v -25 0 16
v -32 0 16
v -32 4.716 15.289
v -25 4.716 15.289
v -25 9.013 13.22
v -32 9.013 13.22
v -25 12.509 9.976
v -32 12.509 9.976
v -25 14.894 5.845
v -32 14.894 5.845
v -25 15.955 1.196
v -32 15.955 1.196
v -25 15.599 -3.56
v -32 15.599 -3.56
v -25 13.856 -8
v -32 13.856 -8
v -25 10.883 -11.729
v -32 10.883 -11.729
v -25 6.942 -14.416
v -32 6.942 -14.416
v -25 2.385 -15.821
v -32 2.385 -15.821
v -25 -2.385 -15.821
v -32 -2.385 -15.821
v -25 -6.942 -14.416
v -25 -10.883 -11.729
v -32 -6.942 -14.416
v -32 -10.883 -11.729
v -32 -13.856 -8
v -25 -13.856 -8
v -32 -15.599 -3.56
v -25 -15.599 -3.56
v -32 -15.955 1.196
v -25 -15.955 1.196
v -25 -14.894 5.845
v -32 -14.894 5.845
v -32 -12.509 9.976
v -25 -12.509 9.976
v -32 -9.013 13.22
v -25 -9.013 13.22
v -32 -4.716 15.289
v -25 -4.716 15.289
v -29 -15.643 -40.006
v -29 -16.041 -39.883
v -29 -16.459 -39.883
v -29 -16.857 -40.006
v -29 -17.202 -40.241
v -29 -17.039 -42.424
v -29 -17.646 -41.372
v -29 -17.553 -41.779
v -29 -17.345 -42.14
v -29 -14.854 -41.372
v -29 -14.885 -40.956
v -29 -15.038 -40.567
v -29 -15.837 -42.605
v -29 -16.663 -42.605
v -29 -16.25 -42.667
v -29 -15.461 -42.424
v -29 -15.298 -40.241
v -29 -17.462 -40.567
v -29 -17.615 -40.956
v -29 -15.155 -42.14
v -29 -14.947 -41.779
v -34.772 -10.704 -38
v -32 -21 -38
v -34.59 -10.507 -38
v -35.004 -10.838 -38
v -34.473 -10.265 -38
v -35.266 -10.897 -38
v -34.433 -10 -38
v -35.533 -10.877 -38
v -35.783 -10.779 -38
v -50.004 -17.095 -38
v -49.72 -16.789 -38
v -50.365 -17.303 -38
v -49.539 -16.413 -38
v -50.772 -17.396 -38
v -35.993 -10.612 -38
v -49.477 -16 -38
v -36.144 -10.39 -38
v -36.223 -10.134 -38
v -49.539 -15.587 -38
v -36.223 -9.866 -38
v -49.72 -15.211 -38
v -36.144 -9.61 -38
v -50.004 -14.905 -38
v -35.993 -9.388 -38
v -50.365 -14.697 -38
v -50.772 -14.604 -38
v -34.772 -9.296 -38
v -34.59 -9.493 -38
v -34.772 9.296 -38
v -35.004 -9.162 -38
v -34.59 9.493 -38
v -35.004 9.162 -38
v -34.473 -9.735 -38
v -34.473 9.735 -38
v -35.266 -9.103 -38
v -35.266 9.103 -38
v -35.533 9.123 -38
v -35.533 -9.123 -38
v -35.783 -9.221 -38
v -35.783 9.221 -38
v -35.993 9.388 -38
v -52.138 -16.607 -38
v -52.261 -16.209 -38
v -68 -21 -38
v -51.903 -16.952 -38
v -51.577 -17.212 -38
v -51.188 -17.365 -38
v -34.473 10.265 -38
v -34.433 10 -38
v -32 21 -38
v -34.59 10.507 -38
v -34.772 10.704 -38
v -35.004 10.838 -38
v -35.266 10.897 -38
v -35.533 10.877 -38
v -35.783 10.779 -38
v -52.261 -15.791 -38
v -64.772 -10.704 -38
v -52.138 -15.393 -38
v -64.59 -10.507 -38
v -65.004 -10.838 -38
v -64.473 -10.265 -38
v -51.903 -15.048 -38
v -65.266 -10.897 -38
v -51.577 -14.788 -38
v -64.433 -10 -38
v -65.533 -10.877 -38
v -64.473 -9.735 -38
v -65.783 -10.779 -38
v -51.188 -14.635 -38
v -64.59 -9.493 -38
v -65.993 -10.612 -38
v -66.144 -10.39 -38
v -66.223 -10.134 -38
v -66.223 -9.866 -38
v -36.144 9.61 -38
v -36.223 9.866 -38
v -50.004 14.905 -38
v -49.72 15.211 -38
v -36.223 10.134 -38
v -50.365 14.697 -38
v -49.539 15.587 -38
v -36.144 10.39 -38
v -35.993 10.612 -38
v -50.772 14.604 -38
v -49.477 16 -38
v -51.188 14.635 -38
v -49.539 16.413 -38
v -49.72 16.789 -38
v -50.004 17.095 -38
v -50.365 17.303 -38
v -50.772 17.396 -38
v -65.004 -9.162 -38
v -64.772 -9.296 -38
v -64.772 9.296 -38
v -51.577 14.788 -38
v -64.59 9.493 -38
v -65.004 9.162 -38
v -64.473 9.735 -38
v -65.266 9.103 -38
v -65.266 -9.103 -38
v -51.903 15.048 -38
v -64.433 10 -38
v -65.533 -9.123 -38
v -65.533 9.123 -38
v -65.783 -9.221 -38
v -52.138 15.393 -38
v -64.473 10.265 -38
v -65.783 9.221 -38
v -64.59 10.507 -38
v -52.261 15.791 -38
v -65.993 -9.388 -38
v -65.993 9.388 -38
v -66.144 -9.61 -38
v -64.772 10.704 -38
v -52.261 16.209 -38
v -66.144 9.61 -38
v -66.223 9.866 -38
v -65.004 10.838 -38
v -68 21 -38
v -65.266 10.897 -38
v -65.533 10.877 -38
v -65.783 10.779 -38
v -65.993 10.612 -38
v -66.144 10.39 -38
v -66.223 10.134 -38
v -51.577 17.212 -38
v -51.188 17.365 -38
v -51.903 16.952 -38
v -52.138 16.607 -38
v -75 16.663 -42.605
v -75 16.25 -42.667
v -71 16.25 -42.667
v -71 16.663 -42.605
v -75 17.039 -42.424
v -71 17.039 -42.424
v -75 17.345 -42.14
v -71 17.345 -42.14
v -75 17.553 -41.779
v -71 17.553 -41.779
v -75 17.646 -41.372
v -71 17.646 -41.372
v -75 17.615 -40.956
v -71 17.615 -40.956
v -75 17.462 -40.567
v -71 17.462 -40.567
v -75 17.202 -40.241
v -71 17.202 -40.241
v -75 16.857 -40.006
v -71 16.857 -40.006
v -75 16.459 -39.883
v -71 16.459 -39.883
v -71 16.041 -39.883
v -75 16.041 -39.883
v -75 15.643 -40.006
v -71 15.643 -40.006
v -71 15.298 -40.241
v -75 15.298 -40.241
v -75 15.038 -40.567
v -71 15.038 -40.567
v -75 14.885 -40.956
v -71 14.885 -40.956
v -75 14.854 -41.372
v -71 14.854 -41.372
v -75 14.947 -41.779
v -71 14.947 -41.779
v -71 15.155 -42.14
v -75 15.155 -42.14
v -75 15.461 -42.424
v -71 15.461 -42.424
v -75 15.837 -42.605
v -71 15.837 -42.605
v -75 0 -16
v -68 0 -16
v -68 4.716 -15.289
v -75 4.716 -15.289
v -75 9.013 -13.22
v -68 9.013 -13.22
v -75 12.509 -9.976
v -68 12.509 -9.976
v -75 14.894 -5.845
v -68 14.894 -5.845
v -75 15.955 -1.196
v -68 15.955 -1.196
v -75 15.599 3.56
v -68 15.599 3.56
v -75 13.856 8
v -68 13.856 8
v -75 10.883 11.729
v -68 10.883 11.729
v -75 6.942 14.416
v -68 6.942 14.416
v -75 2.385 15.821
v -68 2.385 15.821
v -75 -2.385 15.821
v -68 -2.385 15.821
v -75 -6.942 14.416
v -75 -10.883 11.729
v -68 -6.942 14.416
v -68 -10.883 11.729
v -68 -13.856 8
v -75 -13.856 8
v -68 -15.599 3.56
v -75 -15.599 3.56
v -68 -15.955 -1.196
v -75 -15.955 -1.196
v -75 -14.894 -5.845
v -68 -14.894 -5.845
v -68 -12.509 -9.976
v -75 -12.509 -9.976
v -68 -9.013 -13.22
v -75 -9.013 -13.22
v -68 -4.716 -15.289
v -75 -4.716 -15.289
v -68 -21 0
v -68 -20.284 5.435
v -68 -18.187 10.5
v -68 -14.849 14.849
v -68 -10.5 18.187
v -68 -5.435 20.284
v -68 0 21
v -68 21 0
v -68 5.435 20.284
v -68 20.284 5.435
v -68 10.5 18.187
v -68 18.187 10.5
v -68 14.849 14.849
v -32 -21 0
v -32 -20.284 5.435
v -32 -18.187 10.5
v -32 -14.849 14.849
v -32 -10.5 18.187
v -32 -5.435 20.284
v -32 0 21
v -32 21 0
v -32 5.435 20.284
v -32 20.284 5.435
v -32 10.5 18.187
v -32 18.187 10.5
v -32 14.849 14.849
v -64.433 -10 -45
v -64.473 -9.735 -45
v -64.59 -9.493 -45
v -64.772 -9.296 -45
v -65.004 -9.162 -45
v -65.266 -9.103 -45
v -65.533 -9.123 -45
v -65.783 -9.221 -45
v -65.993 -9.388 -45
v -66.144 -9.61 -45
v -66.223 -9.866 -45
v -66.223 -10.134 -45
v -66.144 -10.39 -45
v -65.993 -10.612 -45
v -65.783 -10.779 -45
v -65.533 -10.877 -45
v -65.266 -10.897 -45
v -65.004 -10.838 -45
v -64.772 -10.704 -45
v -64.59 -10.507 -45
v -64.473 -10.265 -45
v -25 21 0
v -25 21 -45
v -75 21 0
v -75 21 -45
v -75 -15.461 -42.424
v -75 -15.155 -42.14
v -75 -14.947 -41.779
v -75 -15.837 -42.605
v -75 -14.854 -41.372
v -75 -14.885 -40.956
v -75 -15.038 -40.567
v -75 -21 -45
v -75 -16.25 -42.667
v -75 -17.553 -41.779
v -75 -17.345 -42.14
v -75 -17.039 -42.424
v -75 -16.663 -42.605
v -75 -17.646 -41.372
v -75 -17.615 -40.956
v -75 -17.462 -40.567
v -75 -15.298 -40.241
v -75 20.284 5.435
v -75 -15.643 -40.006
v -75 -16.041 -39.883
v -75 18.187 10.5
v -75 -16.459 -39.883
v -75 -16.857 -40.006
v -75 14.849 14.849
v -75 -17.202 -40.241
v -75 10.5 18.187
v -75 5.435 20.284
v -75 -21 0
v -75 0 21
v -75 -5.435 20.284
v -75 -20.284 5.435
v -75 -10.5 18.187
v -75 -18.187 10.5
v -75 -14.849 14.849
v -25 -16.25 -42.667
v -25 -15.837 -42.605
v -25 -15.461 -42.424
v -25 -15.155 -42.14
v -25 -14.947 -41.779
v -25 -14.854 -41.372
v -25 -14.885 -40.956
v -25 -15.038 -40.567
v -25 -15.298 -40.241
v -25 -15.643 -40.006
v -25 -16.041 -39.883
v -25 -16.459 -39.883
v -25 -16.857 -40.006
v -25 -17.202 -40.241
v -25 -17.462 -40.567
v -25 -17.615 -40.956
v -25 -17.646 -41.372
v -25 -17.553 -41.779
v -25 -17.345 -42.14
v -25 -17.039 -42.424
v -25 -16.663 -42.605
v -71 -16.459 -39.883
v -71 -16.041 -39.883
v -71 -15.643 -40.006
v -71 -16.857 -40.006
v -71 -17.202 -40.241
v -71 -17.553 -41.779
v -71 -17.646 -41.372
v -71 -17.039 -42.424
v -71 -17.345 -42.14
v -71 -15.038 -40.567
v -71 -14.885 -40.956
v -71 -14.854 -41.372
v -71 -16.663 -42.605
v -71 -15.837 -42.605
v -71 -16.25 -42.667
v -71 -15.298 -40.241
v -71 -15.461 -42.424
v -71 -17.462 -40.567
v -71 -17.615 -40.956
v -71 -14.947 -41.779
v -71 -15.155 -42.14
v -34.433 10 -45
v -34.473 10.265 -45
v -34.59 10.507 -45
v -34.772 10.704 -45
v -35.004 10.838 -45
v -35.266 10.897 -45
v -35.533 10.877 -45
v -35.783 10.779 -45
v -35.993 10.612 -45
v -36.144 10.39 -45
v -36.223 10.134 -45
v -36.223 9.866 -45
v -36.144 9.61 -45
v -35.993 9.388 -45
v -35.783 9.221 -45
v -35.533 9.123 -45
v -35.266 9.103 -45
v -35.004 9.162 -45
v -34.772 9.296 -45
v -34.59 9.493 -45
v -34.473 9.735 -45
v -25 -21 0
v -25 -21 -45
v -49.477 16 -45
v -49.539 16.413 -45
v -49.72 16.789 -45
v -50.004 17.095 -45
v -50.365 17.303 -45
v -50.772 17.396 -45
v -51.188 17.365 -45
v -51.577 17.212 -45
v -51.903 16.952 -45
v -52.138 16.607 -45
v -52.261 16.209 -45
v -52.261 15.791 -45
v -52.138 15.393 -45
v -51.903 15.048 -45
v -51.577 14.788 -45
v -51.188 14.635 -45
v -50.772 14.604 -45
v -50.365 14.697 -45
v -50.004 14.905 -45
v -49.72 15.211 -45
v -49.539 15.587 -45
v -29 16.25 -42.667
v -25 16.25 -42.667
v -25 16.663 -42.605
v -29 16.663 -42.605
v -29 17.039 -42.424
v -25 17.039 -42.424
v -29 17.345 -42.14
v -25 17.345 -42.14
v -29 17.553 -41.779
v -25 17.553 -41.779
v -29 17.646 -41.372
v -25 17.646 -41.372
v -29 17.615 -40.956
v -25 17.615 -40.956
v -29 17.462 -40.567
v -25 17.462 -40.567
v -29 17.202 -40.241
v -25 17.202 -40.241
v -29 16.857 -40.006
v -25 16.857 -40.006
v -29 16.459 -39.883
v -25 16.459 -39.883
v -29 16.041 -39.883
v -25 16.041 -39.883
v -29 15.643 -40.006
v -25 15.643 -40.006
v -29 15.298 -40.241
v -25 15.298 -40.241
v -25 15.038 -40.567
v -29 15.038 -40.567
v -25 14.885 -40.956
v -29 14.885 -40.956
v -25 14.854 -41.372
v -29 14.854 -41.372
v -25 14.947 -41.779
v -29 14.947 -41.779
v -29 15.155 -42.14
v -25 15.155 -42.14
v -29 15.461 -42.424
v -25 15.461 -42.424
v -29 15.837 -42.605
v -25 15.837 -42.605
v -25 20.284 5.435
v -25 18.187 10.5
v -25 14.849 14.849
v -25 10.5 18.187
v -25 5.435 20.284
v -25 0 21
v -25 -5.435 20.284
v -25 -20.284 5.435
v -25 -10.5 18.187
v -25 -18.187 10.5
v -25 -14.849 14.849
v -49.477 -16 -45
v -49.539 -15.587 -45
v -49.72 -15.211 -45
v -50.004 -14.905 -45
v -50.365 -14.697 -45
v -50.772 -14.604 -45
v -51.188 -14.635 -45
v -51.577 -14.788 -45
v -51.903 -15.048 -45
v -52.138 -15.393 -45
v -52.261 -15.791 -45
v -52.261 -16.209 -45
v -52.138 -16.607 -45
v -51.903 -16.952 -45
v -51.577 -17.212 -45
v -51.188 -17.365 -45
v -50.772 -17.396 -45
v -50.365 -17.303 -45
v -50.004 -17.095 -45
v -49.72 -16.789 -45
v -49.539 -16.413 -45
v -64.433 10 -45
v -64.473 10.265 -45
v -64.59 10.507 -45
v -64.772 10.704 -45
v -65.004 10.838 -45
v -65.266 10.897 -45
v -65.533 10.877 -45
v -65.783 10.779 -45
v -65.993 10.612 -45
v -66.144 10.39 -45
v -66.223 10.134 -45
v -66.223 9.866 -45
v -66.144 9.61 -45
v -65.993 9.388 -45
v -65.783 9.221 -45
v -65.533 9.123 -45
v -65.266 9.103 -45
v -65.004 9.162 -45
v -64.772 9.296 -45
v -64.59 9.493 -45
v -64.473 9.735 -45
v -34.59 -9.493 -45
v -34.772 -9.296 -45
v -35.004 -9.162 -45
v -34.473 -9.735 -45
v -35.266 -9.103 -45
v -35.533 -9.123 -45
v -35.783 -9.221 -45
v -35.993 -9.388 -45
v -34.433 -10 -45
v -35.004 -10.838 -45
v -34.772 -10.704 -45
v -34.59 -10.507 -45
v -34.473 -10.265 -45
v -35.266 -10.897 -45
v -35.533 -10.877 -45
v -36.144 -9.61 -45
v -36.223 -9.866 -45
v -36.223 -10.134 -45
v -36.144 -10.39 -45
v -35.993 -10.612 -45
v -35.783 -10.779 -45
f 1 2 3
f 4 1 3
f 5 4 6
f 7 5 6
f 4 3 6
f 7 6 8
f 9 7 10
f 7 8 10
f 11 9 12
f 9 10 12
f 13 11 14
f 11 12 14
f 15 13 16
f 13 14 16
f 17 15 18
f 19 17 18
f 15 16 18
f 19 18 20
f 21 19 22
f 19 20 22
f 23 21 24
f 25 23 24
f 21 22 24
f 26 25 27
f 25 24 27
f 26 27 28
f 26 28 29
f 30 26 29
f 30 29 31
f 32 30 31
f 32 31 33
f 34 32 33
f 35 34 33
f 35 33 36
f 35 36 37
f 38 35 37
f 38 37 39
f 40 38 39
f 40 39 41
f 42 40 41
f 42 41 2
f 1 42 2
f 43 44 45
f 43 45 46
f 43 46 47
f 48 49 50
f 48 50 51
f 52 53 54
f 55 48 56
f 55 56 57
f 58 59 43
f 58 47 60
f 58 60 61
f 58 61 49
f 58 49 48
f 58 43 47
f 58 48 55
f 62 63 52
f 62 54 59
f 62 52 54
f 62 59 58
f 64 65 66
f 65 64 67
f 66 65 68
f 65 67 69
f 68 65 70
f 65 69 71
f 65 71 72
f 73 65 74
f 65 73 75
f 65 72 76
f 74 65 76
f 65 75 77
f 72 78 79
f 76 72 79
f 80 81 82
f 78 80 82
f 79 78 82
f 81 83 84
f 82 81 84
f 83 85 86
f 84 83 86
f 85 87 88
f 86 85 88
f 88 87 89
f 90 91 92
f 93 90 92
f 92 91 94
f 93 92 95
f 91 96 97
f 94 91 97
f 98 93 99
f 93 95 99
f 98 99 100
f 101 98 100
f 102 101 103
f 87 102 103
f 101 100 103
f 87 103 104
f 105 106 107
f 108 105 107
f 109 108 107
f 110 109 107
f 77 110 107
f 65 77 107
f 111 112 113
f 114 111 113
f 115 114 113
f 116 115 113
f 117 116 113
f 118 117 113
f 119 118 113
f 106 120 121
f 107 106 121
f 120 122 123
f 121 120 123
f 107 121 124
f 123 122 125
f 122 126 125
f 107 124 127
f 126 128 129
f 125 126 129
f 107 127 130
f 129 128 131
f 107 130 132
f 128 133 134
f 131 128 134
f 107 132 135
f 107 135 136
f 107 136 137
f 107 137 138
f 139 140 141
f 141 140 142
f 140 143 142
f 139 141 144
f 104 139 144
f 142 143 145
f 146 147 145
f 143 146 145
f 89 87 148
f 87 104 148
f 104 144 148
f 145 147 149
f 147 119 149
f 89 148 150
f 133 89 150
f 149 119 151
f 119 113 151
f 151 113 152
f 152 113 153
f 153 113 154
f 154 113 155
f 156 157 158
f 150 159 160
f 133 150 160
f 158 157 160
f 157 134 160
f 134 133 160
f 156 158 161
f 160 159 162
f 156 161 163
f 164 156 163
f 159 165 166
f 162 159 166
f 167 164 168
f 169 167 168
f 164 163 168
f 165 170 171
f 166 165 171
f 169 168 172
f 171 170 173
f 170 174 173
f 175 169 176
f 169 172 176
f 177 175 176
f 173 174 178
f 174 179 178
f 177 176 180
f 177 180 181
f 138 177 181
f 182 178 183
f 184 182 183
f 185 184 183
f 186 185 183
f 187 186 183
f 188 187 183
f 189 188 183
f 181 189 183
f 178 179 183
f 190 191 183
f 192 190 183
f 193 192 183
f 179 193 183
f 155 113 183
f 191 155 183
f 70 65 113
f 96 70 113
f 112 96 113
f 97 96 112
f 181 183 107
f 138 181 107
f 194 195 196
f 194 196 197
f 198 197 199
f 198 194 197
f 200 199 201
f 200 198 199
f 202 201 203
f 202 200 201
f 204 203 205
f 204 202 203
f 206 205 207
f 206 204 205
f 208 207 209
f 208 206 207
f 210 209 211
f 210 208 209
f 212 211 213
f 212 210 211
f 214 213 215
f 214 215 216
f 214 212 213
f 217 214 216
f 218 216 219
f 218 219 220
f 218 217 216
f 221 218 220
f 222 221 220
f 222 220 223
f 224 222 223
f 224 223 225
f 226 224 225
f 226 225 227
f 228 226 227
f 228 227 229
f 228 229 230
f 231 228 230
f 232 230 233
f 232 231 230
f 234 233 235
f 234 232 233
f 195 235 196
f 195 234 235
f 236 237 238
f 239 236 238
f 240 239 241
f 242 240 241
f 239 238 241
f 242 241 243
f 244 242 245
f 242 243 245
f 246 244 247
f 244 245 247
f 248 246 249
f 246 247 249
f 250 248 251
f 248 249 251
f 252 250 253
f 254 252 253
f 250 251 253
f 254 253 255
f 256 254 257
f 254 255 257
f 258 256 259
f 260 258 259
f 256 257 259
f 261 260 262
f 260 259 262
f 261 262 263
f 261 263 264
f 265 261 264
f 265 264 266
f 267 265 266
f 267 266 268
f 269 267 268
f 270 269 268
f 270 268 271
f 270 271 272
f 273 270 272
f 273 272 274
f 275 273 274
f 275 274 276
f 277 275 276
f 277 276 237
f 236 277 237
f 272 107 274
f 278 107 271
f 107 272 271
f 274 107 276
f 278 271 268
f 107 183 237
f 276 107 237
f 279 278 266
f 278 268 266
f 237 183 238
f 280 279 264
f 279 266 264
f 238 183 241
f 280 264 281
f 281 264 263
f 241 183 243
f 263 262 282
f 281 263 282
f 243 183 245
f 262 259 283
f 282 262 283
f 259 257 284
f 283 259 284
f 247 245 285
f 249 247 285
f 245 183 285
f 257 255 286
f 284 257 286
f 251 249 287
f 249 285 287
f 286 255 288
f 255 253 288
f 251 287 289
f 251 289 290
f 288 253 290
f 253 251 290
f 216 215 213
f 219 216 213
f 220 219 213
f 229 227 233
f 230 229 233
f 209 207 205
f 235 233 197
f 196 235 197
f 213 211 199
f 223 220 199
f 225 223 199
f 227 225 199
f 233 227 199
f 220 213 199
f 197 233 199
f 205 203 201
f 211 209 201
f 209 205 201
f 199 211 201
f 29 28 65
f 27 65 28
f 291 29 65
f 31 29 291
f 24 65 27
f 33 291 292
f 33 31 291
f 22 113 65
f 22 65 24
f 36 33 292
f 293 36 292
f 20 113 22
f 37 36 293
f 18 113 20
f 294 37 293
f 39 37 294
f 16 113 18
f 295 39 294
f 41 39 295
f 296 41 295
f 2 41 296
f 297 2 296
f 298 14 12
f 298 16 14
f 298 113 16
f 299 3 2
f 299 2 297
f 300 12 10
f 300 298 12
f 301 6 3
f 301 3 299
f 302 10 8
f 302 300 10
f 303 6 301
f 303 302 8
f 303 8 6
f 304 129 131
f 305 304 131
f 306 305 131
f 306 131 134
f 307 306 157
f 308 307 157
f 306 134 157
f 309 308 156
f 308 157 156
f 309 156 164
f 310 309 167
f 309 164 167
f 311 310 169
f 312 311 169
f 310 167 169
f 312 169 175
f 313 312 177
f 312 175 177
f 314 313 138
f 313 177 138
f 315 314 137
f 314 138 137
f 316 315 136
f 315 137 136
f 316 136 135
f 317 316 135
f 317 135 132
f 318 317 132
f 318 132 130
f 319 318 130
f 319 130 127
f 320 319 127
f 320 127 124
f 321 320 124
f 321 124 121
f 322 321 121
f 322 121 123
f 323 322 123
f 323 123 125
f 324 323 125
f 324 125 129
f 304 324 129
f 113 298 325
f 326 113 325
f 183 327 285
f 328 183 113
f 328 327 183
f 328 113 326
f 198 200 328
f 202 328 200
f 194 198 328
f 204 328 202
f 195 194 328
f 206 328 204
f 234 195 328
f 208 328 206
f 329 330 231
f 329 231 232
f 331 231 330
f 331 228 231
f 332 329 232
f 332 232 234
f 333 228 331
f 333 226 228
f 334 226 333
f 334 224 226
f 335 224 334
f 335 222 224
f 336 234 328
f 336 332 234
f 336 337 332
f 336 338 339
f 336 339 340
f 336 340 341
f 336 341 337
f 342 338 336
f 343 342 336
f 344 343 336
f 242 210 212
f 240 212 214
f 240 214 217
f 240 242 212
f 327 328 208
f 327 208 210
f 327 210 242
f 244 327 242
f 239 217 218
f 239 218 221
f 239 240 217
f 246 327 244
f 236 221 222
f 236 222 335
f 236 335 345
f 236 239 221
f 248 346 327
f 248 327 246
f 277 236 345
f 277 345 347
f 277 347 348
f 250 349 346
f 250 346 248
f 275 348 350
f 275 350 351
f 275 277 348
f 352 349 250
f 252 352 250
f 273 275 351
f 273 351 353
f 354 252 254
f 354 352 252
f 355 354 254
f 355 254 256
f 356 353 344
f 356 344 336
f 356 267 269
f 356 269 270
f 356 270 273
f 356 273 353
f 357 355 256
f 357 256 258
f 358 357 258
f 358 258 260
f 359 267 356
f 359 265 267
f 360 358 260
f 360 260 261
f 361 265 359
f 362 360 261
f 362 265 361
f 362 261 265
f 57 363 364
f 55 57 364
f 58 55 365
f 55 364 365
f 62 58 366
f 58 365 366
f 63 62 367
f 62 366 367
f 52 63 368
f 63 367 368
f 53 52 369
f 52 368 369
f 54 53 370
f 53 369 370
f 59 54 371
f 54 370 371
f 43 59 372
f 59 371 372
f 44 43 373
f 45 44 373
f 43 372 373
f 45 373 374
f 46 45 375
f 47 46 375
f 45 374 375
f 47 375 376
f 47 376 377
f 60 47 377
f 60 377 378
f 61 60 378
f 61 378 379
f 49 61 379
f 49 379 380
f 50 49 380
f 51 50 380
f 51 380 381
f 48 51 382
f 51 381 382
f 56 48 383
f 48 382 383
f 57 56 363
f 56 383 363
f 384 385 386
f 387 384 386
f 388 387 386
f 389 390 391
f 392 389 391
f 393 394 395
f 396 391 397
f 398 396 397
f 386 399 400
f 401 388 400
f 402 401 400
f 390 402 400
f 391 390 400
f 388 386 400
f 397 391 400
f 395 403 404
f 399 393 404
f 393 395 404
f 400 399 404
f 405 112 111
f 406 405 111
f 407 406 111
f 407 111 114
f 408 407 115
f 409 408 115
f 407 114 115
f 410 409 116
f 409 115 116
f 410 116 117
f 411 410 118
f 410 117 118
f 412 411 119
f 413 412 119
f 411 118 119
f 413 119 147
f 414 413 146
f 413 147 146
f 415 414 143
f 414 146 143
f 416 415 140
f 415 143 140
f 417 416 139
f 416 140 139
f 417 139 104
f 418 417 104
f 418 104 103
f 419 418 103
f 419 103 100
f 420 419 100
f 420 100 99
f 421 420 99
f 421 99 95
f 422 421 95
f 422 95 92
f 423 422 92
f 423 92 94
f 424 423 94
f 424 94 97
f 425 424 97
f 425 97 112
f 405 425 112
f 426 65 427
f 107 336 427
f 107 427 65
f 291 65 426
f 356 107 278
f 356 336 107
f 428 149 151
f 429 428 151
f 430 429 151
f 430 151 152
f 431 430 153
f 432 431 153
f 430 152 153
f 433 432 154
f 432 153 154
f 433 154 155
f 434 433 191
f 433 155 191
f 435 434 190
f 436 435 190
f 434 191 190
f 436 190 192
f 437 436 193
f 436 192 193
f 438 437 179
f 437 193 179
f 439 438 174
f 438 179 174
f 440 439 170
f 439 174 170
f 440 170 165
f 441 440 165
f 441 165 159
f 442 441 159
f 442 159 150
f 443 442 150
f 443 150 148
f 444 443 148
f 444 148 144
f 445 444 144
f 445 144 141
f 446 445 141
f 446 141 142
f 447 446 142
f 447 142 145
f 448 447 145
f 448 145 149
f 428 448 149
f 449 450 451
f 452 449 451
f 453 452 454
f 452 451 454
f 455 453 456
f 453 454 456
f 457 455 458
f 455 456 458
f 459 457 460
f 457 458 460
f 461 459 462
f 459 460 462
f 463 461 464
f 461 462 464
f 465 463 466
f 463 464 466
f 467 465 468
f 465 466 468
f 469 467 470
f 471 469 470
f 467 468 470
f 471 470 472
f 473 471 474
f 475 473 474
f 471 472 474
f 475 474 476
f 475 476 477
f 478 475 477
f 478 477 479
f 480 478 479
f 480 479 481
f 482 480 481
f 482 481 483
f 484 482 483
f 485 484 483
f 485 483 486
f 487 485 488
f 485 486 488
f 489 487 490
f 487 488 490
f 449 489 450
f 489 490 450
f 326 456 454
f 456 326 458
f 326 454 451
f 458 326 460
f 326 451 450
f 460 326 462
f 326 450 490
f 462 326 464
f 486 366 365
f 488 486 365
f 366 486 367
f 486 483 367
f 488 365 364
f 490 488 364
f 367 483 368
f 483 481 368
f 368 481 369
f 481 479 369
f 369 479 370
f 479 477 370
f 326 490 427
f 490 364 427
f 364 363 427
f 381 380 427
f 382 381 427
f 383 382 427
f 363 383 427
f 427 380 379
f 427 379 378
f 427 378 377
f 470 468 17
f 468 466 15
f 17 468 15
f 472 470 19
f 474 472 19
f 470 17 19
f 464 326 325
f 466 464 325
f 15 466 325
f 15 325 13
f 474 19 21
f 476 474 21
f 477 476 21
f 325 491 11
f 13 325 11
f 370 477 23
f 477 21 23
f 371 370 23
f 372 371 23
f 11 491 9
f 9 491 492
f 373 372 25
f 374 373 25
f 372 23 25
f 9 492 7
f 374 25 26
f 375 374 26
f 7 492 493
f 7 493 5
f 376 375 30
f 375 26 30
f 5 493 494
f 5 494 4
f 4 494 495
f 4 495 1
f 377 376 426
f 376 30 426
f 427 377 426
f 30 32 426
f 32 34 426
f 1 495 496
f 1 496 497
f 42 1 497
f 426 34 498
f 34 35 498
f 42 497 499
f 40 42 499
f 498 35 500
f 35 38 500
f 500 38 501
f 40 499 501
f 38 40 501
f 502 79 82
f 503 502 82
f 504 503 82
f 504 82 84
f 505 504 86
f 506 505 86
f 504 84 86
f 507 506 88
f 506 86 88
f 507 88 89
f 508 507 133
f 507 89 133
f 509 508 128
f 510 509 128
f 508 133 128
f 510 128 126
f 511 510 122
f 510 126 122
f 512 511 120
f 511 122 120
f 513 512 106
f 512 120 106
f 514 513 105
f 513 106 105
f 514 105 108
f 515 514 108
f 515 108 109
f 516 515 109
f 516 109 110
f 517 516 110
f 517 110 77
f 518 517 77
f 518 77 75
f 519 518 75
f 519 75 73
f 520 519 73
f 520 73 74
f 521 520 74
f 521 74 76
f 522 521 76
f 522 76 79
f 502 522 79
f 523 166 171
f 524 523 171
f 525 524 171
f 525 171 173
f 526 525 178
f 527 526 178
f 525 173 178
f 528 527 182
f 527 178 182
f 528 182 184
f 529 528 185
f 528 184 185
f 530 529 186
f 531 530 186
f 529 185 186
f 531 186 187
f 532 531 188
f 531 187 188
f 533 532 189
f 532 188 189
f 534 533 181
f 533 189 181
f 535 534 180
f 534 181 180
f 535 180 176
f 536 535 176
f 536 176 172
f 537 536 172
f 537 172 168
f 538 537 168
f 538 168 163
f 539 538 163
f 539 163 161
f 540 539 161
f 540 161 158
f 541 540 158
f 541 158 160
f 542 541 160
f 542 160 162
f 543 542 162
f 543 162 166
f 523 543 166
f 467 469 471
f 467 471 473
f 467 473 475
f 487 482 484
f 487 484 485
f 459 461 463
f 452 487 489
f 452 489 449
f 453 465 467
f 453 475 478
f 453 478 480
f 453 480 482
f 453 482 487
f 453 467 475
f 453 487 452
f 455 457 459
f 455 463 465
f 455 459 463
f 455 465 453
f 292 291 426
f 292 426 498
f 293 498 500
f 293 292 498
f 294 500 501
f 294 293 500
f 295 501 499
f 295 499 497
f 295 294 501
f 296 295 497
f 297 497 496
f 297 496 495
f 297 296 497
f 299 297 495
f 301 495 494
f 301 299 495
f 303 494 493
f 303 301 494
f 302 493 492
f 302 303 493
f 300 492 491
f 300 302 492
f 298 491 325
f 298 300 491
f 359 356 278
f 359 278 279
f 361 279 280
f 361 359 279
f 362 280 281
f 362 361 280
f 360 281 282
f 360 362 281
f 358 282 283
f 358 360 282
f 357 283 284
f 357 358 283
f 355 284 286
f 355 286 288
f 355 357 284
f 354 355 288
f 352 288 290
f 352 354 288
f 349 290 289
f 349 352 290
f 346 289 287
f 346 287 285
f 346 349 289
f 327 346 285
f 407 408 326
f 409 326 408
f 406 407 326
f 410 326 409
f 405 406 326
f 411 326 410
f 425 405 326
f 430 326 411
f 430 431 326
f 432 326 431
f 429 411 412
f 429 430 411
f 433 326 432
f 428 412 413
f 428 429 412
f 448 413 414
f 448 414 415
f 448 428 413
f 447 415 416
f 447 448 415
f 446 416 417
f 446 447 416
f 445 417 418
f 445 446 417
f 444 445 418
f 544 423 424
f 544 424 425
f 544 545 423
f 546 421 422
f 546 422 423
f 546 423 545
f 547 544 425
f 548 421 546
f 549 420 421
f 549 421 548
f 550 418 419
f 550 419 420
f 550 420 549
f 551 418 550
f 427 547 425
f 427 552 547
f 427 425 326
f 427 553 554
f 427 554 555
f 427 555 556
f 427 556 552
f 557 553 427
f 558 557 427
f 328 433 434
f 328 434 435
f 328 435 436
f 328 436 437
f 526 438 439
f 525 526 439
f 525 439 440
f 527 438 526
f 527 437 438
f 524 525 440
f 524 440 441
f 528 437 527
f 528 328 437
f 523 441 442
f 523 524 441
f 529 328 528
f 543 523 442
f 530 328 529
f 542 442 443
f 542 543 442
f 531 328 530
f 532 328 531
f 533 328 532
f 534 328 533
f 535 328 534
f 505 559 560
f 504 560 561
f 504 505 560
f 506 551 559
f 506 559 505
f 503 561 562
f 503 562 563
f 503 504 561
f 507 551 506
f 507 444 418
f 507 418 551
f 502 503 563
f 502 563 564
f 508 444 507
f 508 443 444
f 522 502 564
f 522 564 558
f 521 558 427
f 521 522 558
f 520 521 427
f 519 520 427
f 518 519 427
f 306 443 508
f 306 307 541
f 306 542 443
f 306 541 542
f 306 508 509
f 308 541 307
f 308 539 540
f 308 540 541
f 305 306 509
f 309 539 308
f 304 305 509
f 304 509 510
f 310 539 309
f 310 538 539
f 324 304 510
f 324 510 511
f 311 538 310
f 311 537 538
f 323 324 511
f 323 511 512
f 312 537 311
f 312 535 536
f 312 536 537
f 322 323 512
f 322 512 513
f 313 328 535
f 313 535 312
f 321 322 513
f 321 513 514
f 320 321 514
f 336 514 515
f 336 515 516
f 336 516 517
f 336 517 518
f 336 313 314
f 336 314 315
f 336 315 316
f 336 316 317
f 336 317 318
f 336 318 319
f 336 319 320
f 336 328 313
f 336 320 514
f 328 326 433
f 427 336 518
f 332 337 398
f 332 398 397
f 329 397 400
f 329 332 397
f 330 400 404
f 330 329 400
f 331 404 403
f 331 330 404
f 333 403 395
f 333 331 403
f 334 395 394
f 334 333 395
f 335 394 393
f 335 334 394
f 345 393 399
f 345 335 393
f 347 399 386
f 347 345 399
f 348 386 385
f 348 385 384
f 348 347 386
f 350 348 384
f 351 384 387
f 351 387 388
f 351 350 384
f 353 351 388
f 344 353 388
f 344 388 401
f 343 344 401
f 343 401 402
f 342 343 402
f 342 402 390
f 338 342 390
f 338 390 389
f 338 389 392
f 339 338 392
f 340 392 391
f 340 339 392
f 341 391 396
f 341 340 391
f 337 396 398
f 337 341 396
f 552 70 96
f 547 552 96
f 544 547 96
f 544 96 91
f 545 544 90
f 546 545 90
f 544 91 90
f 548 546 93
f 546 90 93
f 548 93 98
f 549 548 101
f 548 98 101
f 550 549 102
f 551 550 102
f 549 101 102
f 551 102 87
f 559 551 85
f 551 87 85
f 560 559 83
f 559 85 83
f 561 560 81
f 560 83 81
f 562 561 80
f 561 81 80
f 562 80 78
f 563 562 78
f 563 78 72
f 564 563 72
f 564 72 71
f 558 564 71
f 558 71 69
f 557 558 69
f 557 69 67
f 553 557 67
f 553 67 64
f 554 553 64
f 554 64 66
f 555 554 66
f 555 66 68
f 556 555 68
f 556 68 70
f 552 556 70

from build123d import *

# Parameters (mm, degrees)
EXTRUDE_1_DEPTH             = 50
SKETCH_2_W                  = 36
SKETCH_2_H                  = 102.163867091
CUT_EXTRUDE_1_DEPTH         = 43
HOLE_WIZARD_1_8_1_8_1_D     = 1.8
HOLE_WIZARD_1_8_1_8_1_DEPTH = 7
HOLE_WIZARD_M30_1_D         = 32
HOLE_WIZARD_M30_1_DEPTH     = 7
HOLE_WIZARD_M30_2_D         = 32
HOLE_WIZARD_M30_2_DEPTH     = 7
SKETCH_13_R                 = 1.4
CUT_EXTRUDE_2_DEPTH         = 10
SKETCH_14_R                 = 1.4
CUT_EXTRUDE_3_DEPTH         = 4


with BuildPart() as part:
    # 스케치1 → 보스-돌출1 (new body)
    with BuildSketch(Plane(origin=(-75, 0, 0), x_dir=(0, -1, 0), z_dir=(-1, 0, 0))):
        with BuildLine():
            Line((-21, 0), (-21, -45))
            Line((-21, -45), (21, -45))
            Line((21, -45), (21, 0))
            ThreePointArc((21, 0), (0, 21), (-21, 0))
        make_face()
    extrude(amount=-EXTRUDE_1_DEPTH)

    # 스케치2 → 컷-돌출1 (cut, through all)
    with BuildSketch(Plane(origin=(0, 21, 0), x_dir=(-1, 0, 0), z_dir=(0, 1, 0))):
        with Locations((50, 13.081933546)):
            Rectangle(SKETCH_2_W, SKETCH_2_H)
    extrude(amount=-CUT_EXTRUDE_1_DEPTH, mode=Mode.SUBTRACT)

    # Ø1.8 (1.8) 지름 구멍1
    with Locations(Plane(origin=(0, 0, -45), x_dir=(-1, 0, 0), z_dir=(0, 0, -1))):
        with Locations((35.3332236, 10), (65.3332236, 10), (35.3332236, -10), (65.3332236, -10)):
            Hole(HOLE_WIZARD_1_8_1_8_1_D / 2, depth=HOLE_WIZARD_1_8_1_8_1_DEPTH)

    # M30 여유 구멍1
    with Locations(Plane(origin=(-25, 0, 0), x_dir=(0, 0, -1), z_dir=(1, 0, 0))):
        with Locations((0, 0)):
            Hole(HOLE_WIZARD_M30_1_D / 2, depth=HOLE_WIZARD_M30_1_DEPTH)

    # M30 여유 구멍2
    with Locations(Plane.ZY.offset(75)):
        with Locations((0, 0)):
            Hole(HOLE_WIZARD_M30_2_D / 2, depth=HOLE_WIZARD_M30_2_DEPTH)

    # 스케치13 → 컷-돌출2 (cut)
    with BuildSketch(Plane.XY.offset(-38)):
        with Locations((-50.876817985, -16)):
            Circle(SKETCH_13_R)
        with Locations((-50.876817985, 16)):
            Circle(SKETCH_13_R)
    extrude(amount=-CUT_EXTRUDE_2_DEPTH, mode=Mode.SUBTRACT)

    # 스케치14 → 컷-돌출3 (cut)
    with BuildSketch(Plane(origin=(-25, 0, 0), x_dir=(0, 0, -1), z_dir=(1, 0, 0))):
        with Locations((41.267143481, 16.25)):
            Circle(SKETCH_14_R)
        with Locations((41.267143481, -16.25)):
            Circle(SKETCH_14_R)
    cut_extrude_3 = extrude(amount=-CUT_EXTRUDE_3_DEPTH, mode=Mode.SUBTRACT)

    # 대칭 복사1: 컷-돌출3 across plane
    add(cut_extrude_3.mirror(Plane.ZY.offset(50)), mode=Mode.SUBTRACT)


solid = part.part
